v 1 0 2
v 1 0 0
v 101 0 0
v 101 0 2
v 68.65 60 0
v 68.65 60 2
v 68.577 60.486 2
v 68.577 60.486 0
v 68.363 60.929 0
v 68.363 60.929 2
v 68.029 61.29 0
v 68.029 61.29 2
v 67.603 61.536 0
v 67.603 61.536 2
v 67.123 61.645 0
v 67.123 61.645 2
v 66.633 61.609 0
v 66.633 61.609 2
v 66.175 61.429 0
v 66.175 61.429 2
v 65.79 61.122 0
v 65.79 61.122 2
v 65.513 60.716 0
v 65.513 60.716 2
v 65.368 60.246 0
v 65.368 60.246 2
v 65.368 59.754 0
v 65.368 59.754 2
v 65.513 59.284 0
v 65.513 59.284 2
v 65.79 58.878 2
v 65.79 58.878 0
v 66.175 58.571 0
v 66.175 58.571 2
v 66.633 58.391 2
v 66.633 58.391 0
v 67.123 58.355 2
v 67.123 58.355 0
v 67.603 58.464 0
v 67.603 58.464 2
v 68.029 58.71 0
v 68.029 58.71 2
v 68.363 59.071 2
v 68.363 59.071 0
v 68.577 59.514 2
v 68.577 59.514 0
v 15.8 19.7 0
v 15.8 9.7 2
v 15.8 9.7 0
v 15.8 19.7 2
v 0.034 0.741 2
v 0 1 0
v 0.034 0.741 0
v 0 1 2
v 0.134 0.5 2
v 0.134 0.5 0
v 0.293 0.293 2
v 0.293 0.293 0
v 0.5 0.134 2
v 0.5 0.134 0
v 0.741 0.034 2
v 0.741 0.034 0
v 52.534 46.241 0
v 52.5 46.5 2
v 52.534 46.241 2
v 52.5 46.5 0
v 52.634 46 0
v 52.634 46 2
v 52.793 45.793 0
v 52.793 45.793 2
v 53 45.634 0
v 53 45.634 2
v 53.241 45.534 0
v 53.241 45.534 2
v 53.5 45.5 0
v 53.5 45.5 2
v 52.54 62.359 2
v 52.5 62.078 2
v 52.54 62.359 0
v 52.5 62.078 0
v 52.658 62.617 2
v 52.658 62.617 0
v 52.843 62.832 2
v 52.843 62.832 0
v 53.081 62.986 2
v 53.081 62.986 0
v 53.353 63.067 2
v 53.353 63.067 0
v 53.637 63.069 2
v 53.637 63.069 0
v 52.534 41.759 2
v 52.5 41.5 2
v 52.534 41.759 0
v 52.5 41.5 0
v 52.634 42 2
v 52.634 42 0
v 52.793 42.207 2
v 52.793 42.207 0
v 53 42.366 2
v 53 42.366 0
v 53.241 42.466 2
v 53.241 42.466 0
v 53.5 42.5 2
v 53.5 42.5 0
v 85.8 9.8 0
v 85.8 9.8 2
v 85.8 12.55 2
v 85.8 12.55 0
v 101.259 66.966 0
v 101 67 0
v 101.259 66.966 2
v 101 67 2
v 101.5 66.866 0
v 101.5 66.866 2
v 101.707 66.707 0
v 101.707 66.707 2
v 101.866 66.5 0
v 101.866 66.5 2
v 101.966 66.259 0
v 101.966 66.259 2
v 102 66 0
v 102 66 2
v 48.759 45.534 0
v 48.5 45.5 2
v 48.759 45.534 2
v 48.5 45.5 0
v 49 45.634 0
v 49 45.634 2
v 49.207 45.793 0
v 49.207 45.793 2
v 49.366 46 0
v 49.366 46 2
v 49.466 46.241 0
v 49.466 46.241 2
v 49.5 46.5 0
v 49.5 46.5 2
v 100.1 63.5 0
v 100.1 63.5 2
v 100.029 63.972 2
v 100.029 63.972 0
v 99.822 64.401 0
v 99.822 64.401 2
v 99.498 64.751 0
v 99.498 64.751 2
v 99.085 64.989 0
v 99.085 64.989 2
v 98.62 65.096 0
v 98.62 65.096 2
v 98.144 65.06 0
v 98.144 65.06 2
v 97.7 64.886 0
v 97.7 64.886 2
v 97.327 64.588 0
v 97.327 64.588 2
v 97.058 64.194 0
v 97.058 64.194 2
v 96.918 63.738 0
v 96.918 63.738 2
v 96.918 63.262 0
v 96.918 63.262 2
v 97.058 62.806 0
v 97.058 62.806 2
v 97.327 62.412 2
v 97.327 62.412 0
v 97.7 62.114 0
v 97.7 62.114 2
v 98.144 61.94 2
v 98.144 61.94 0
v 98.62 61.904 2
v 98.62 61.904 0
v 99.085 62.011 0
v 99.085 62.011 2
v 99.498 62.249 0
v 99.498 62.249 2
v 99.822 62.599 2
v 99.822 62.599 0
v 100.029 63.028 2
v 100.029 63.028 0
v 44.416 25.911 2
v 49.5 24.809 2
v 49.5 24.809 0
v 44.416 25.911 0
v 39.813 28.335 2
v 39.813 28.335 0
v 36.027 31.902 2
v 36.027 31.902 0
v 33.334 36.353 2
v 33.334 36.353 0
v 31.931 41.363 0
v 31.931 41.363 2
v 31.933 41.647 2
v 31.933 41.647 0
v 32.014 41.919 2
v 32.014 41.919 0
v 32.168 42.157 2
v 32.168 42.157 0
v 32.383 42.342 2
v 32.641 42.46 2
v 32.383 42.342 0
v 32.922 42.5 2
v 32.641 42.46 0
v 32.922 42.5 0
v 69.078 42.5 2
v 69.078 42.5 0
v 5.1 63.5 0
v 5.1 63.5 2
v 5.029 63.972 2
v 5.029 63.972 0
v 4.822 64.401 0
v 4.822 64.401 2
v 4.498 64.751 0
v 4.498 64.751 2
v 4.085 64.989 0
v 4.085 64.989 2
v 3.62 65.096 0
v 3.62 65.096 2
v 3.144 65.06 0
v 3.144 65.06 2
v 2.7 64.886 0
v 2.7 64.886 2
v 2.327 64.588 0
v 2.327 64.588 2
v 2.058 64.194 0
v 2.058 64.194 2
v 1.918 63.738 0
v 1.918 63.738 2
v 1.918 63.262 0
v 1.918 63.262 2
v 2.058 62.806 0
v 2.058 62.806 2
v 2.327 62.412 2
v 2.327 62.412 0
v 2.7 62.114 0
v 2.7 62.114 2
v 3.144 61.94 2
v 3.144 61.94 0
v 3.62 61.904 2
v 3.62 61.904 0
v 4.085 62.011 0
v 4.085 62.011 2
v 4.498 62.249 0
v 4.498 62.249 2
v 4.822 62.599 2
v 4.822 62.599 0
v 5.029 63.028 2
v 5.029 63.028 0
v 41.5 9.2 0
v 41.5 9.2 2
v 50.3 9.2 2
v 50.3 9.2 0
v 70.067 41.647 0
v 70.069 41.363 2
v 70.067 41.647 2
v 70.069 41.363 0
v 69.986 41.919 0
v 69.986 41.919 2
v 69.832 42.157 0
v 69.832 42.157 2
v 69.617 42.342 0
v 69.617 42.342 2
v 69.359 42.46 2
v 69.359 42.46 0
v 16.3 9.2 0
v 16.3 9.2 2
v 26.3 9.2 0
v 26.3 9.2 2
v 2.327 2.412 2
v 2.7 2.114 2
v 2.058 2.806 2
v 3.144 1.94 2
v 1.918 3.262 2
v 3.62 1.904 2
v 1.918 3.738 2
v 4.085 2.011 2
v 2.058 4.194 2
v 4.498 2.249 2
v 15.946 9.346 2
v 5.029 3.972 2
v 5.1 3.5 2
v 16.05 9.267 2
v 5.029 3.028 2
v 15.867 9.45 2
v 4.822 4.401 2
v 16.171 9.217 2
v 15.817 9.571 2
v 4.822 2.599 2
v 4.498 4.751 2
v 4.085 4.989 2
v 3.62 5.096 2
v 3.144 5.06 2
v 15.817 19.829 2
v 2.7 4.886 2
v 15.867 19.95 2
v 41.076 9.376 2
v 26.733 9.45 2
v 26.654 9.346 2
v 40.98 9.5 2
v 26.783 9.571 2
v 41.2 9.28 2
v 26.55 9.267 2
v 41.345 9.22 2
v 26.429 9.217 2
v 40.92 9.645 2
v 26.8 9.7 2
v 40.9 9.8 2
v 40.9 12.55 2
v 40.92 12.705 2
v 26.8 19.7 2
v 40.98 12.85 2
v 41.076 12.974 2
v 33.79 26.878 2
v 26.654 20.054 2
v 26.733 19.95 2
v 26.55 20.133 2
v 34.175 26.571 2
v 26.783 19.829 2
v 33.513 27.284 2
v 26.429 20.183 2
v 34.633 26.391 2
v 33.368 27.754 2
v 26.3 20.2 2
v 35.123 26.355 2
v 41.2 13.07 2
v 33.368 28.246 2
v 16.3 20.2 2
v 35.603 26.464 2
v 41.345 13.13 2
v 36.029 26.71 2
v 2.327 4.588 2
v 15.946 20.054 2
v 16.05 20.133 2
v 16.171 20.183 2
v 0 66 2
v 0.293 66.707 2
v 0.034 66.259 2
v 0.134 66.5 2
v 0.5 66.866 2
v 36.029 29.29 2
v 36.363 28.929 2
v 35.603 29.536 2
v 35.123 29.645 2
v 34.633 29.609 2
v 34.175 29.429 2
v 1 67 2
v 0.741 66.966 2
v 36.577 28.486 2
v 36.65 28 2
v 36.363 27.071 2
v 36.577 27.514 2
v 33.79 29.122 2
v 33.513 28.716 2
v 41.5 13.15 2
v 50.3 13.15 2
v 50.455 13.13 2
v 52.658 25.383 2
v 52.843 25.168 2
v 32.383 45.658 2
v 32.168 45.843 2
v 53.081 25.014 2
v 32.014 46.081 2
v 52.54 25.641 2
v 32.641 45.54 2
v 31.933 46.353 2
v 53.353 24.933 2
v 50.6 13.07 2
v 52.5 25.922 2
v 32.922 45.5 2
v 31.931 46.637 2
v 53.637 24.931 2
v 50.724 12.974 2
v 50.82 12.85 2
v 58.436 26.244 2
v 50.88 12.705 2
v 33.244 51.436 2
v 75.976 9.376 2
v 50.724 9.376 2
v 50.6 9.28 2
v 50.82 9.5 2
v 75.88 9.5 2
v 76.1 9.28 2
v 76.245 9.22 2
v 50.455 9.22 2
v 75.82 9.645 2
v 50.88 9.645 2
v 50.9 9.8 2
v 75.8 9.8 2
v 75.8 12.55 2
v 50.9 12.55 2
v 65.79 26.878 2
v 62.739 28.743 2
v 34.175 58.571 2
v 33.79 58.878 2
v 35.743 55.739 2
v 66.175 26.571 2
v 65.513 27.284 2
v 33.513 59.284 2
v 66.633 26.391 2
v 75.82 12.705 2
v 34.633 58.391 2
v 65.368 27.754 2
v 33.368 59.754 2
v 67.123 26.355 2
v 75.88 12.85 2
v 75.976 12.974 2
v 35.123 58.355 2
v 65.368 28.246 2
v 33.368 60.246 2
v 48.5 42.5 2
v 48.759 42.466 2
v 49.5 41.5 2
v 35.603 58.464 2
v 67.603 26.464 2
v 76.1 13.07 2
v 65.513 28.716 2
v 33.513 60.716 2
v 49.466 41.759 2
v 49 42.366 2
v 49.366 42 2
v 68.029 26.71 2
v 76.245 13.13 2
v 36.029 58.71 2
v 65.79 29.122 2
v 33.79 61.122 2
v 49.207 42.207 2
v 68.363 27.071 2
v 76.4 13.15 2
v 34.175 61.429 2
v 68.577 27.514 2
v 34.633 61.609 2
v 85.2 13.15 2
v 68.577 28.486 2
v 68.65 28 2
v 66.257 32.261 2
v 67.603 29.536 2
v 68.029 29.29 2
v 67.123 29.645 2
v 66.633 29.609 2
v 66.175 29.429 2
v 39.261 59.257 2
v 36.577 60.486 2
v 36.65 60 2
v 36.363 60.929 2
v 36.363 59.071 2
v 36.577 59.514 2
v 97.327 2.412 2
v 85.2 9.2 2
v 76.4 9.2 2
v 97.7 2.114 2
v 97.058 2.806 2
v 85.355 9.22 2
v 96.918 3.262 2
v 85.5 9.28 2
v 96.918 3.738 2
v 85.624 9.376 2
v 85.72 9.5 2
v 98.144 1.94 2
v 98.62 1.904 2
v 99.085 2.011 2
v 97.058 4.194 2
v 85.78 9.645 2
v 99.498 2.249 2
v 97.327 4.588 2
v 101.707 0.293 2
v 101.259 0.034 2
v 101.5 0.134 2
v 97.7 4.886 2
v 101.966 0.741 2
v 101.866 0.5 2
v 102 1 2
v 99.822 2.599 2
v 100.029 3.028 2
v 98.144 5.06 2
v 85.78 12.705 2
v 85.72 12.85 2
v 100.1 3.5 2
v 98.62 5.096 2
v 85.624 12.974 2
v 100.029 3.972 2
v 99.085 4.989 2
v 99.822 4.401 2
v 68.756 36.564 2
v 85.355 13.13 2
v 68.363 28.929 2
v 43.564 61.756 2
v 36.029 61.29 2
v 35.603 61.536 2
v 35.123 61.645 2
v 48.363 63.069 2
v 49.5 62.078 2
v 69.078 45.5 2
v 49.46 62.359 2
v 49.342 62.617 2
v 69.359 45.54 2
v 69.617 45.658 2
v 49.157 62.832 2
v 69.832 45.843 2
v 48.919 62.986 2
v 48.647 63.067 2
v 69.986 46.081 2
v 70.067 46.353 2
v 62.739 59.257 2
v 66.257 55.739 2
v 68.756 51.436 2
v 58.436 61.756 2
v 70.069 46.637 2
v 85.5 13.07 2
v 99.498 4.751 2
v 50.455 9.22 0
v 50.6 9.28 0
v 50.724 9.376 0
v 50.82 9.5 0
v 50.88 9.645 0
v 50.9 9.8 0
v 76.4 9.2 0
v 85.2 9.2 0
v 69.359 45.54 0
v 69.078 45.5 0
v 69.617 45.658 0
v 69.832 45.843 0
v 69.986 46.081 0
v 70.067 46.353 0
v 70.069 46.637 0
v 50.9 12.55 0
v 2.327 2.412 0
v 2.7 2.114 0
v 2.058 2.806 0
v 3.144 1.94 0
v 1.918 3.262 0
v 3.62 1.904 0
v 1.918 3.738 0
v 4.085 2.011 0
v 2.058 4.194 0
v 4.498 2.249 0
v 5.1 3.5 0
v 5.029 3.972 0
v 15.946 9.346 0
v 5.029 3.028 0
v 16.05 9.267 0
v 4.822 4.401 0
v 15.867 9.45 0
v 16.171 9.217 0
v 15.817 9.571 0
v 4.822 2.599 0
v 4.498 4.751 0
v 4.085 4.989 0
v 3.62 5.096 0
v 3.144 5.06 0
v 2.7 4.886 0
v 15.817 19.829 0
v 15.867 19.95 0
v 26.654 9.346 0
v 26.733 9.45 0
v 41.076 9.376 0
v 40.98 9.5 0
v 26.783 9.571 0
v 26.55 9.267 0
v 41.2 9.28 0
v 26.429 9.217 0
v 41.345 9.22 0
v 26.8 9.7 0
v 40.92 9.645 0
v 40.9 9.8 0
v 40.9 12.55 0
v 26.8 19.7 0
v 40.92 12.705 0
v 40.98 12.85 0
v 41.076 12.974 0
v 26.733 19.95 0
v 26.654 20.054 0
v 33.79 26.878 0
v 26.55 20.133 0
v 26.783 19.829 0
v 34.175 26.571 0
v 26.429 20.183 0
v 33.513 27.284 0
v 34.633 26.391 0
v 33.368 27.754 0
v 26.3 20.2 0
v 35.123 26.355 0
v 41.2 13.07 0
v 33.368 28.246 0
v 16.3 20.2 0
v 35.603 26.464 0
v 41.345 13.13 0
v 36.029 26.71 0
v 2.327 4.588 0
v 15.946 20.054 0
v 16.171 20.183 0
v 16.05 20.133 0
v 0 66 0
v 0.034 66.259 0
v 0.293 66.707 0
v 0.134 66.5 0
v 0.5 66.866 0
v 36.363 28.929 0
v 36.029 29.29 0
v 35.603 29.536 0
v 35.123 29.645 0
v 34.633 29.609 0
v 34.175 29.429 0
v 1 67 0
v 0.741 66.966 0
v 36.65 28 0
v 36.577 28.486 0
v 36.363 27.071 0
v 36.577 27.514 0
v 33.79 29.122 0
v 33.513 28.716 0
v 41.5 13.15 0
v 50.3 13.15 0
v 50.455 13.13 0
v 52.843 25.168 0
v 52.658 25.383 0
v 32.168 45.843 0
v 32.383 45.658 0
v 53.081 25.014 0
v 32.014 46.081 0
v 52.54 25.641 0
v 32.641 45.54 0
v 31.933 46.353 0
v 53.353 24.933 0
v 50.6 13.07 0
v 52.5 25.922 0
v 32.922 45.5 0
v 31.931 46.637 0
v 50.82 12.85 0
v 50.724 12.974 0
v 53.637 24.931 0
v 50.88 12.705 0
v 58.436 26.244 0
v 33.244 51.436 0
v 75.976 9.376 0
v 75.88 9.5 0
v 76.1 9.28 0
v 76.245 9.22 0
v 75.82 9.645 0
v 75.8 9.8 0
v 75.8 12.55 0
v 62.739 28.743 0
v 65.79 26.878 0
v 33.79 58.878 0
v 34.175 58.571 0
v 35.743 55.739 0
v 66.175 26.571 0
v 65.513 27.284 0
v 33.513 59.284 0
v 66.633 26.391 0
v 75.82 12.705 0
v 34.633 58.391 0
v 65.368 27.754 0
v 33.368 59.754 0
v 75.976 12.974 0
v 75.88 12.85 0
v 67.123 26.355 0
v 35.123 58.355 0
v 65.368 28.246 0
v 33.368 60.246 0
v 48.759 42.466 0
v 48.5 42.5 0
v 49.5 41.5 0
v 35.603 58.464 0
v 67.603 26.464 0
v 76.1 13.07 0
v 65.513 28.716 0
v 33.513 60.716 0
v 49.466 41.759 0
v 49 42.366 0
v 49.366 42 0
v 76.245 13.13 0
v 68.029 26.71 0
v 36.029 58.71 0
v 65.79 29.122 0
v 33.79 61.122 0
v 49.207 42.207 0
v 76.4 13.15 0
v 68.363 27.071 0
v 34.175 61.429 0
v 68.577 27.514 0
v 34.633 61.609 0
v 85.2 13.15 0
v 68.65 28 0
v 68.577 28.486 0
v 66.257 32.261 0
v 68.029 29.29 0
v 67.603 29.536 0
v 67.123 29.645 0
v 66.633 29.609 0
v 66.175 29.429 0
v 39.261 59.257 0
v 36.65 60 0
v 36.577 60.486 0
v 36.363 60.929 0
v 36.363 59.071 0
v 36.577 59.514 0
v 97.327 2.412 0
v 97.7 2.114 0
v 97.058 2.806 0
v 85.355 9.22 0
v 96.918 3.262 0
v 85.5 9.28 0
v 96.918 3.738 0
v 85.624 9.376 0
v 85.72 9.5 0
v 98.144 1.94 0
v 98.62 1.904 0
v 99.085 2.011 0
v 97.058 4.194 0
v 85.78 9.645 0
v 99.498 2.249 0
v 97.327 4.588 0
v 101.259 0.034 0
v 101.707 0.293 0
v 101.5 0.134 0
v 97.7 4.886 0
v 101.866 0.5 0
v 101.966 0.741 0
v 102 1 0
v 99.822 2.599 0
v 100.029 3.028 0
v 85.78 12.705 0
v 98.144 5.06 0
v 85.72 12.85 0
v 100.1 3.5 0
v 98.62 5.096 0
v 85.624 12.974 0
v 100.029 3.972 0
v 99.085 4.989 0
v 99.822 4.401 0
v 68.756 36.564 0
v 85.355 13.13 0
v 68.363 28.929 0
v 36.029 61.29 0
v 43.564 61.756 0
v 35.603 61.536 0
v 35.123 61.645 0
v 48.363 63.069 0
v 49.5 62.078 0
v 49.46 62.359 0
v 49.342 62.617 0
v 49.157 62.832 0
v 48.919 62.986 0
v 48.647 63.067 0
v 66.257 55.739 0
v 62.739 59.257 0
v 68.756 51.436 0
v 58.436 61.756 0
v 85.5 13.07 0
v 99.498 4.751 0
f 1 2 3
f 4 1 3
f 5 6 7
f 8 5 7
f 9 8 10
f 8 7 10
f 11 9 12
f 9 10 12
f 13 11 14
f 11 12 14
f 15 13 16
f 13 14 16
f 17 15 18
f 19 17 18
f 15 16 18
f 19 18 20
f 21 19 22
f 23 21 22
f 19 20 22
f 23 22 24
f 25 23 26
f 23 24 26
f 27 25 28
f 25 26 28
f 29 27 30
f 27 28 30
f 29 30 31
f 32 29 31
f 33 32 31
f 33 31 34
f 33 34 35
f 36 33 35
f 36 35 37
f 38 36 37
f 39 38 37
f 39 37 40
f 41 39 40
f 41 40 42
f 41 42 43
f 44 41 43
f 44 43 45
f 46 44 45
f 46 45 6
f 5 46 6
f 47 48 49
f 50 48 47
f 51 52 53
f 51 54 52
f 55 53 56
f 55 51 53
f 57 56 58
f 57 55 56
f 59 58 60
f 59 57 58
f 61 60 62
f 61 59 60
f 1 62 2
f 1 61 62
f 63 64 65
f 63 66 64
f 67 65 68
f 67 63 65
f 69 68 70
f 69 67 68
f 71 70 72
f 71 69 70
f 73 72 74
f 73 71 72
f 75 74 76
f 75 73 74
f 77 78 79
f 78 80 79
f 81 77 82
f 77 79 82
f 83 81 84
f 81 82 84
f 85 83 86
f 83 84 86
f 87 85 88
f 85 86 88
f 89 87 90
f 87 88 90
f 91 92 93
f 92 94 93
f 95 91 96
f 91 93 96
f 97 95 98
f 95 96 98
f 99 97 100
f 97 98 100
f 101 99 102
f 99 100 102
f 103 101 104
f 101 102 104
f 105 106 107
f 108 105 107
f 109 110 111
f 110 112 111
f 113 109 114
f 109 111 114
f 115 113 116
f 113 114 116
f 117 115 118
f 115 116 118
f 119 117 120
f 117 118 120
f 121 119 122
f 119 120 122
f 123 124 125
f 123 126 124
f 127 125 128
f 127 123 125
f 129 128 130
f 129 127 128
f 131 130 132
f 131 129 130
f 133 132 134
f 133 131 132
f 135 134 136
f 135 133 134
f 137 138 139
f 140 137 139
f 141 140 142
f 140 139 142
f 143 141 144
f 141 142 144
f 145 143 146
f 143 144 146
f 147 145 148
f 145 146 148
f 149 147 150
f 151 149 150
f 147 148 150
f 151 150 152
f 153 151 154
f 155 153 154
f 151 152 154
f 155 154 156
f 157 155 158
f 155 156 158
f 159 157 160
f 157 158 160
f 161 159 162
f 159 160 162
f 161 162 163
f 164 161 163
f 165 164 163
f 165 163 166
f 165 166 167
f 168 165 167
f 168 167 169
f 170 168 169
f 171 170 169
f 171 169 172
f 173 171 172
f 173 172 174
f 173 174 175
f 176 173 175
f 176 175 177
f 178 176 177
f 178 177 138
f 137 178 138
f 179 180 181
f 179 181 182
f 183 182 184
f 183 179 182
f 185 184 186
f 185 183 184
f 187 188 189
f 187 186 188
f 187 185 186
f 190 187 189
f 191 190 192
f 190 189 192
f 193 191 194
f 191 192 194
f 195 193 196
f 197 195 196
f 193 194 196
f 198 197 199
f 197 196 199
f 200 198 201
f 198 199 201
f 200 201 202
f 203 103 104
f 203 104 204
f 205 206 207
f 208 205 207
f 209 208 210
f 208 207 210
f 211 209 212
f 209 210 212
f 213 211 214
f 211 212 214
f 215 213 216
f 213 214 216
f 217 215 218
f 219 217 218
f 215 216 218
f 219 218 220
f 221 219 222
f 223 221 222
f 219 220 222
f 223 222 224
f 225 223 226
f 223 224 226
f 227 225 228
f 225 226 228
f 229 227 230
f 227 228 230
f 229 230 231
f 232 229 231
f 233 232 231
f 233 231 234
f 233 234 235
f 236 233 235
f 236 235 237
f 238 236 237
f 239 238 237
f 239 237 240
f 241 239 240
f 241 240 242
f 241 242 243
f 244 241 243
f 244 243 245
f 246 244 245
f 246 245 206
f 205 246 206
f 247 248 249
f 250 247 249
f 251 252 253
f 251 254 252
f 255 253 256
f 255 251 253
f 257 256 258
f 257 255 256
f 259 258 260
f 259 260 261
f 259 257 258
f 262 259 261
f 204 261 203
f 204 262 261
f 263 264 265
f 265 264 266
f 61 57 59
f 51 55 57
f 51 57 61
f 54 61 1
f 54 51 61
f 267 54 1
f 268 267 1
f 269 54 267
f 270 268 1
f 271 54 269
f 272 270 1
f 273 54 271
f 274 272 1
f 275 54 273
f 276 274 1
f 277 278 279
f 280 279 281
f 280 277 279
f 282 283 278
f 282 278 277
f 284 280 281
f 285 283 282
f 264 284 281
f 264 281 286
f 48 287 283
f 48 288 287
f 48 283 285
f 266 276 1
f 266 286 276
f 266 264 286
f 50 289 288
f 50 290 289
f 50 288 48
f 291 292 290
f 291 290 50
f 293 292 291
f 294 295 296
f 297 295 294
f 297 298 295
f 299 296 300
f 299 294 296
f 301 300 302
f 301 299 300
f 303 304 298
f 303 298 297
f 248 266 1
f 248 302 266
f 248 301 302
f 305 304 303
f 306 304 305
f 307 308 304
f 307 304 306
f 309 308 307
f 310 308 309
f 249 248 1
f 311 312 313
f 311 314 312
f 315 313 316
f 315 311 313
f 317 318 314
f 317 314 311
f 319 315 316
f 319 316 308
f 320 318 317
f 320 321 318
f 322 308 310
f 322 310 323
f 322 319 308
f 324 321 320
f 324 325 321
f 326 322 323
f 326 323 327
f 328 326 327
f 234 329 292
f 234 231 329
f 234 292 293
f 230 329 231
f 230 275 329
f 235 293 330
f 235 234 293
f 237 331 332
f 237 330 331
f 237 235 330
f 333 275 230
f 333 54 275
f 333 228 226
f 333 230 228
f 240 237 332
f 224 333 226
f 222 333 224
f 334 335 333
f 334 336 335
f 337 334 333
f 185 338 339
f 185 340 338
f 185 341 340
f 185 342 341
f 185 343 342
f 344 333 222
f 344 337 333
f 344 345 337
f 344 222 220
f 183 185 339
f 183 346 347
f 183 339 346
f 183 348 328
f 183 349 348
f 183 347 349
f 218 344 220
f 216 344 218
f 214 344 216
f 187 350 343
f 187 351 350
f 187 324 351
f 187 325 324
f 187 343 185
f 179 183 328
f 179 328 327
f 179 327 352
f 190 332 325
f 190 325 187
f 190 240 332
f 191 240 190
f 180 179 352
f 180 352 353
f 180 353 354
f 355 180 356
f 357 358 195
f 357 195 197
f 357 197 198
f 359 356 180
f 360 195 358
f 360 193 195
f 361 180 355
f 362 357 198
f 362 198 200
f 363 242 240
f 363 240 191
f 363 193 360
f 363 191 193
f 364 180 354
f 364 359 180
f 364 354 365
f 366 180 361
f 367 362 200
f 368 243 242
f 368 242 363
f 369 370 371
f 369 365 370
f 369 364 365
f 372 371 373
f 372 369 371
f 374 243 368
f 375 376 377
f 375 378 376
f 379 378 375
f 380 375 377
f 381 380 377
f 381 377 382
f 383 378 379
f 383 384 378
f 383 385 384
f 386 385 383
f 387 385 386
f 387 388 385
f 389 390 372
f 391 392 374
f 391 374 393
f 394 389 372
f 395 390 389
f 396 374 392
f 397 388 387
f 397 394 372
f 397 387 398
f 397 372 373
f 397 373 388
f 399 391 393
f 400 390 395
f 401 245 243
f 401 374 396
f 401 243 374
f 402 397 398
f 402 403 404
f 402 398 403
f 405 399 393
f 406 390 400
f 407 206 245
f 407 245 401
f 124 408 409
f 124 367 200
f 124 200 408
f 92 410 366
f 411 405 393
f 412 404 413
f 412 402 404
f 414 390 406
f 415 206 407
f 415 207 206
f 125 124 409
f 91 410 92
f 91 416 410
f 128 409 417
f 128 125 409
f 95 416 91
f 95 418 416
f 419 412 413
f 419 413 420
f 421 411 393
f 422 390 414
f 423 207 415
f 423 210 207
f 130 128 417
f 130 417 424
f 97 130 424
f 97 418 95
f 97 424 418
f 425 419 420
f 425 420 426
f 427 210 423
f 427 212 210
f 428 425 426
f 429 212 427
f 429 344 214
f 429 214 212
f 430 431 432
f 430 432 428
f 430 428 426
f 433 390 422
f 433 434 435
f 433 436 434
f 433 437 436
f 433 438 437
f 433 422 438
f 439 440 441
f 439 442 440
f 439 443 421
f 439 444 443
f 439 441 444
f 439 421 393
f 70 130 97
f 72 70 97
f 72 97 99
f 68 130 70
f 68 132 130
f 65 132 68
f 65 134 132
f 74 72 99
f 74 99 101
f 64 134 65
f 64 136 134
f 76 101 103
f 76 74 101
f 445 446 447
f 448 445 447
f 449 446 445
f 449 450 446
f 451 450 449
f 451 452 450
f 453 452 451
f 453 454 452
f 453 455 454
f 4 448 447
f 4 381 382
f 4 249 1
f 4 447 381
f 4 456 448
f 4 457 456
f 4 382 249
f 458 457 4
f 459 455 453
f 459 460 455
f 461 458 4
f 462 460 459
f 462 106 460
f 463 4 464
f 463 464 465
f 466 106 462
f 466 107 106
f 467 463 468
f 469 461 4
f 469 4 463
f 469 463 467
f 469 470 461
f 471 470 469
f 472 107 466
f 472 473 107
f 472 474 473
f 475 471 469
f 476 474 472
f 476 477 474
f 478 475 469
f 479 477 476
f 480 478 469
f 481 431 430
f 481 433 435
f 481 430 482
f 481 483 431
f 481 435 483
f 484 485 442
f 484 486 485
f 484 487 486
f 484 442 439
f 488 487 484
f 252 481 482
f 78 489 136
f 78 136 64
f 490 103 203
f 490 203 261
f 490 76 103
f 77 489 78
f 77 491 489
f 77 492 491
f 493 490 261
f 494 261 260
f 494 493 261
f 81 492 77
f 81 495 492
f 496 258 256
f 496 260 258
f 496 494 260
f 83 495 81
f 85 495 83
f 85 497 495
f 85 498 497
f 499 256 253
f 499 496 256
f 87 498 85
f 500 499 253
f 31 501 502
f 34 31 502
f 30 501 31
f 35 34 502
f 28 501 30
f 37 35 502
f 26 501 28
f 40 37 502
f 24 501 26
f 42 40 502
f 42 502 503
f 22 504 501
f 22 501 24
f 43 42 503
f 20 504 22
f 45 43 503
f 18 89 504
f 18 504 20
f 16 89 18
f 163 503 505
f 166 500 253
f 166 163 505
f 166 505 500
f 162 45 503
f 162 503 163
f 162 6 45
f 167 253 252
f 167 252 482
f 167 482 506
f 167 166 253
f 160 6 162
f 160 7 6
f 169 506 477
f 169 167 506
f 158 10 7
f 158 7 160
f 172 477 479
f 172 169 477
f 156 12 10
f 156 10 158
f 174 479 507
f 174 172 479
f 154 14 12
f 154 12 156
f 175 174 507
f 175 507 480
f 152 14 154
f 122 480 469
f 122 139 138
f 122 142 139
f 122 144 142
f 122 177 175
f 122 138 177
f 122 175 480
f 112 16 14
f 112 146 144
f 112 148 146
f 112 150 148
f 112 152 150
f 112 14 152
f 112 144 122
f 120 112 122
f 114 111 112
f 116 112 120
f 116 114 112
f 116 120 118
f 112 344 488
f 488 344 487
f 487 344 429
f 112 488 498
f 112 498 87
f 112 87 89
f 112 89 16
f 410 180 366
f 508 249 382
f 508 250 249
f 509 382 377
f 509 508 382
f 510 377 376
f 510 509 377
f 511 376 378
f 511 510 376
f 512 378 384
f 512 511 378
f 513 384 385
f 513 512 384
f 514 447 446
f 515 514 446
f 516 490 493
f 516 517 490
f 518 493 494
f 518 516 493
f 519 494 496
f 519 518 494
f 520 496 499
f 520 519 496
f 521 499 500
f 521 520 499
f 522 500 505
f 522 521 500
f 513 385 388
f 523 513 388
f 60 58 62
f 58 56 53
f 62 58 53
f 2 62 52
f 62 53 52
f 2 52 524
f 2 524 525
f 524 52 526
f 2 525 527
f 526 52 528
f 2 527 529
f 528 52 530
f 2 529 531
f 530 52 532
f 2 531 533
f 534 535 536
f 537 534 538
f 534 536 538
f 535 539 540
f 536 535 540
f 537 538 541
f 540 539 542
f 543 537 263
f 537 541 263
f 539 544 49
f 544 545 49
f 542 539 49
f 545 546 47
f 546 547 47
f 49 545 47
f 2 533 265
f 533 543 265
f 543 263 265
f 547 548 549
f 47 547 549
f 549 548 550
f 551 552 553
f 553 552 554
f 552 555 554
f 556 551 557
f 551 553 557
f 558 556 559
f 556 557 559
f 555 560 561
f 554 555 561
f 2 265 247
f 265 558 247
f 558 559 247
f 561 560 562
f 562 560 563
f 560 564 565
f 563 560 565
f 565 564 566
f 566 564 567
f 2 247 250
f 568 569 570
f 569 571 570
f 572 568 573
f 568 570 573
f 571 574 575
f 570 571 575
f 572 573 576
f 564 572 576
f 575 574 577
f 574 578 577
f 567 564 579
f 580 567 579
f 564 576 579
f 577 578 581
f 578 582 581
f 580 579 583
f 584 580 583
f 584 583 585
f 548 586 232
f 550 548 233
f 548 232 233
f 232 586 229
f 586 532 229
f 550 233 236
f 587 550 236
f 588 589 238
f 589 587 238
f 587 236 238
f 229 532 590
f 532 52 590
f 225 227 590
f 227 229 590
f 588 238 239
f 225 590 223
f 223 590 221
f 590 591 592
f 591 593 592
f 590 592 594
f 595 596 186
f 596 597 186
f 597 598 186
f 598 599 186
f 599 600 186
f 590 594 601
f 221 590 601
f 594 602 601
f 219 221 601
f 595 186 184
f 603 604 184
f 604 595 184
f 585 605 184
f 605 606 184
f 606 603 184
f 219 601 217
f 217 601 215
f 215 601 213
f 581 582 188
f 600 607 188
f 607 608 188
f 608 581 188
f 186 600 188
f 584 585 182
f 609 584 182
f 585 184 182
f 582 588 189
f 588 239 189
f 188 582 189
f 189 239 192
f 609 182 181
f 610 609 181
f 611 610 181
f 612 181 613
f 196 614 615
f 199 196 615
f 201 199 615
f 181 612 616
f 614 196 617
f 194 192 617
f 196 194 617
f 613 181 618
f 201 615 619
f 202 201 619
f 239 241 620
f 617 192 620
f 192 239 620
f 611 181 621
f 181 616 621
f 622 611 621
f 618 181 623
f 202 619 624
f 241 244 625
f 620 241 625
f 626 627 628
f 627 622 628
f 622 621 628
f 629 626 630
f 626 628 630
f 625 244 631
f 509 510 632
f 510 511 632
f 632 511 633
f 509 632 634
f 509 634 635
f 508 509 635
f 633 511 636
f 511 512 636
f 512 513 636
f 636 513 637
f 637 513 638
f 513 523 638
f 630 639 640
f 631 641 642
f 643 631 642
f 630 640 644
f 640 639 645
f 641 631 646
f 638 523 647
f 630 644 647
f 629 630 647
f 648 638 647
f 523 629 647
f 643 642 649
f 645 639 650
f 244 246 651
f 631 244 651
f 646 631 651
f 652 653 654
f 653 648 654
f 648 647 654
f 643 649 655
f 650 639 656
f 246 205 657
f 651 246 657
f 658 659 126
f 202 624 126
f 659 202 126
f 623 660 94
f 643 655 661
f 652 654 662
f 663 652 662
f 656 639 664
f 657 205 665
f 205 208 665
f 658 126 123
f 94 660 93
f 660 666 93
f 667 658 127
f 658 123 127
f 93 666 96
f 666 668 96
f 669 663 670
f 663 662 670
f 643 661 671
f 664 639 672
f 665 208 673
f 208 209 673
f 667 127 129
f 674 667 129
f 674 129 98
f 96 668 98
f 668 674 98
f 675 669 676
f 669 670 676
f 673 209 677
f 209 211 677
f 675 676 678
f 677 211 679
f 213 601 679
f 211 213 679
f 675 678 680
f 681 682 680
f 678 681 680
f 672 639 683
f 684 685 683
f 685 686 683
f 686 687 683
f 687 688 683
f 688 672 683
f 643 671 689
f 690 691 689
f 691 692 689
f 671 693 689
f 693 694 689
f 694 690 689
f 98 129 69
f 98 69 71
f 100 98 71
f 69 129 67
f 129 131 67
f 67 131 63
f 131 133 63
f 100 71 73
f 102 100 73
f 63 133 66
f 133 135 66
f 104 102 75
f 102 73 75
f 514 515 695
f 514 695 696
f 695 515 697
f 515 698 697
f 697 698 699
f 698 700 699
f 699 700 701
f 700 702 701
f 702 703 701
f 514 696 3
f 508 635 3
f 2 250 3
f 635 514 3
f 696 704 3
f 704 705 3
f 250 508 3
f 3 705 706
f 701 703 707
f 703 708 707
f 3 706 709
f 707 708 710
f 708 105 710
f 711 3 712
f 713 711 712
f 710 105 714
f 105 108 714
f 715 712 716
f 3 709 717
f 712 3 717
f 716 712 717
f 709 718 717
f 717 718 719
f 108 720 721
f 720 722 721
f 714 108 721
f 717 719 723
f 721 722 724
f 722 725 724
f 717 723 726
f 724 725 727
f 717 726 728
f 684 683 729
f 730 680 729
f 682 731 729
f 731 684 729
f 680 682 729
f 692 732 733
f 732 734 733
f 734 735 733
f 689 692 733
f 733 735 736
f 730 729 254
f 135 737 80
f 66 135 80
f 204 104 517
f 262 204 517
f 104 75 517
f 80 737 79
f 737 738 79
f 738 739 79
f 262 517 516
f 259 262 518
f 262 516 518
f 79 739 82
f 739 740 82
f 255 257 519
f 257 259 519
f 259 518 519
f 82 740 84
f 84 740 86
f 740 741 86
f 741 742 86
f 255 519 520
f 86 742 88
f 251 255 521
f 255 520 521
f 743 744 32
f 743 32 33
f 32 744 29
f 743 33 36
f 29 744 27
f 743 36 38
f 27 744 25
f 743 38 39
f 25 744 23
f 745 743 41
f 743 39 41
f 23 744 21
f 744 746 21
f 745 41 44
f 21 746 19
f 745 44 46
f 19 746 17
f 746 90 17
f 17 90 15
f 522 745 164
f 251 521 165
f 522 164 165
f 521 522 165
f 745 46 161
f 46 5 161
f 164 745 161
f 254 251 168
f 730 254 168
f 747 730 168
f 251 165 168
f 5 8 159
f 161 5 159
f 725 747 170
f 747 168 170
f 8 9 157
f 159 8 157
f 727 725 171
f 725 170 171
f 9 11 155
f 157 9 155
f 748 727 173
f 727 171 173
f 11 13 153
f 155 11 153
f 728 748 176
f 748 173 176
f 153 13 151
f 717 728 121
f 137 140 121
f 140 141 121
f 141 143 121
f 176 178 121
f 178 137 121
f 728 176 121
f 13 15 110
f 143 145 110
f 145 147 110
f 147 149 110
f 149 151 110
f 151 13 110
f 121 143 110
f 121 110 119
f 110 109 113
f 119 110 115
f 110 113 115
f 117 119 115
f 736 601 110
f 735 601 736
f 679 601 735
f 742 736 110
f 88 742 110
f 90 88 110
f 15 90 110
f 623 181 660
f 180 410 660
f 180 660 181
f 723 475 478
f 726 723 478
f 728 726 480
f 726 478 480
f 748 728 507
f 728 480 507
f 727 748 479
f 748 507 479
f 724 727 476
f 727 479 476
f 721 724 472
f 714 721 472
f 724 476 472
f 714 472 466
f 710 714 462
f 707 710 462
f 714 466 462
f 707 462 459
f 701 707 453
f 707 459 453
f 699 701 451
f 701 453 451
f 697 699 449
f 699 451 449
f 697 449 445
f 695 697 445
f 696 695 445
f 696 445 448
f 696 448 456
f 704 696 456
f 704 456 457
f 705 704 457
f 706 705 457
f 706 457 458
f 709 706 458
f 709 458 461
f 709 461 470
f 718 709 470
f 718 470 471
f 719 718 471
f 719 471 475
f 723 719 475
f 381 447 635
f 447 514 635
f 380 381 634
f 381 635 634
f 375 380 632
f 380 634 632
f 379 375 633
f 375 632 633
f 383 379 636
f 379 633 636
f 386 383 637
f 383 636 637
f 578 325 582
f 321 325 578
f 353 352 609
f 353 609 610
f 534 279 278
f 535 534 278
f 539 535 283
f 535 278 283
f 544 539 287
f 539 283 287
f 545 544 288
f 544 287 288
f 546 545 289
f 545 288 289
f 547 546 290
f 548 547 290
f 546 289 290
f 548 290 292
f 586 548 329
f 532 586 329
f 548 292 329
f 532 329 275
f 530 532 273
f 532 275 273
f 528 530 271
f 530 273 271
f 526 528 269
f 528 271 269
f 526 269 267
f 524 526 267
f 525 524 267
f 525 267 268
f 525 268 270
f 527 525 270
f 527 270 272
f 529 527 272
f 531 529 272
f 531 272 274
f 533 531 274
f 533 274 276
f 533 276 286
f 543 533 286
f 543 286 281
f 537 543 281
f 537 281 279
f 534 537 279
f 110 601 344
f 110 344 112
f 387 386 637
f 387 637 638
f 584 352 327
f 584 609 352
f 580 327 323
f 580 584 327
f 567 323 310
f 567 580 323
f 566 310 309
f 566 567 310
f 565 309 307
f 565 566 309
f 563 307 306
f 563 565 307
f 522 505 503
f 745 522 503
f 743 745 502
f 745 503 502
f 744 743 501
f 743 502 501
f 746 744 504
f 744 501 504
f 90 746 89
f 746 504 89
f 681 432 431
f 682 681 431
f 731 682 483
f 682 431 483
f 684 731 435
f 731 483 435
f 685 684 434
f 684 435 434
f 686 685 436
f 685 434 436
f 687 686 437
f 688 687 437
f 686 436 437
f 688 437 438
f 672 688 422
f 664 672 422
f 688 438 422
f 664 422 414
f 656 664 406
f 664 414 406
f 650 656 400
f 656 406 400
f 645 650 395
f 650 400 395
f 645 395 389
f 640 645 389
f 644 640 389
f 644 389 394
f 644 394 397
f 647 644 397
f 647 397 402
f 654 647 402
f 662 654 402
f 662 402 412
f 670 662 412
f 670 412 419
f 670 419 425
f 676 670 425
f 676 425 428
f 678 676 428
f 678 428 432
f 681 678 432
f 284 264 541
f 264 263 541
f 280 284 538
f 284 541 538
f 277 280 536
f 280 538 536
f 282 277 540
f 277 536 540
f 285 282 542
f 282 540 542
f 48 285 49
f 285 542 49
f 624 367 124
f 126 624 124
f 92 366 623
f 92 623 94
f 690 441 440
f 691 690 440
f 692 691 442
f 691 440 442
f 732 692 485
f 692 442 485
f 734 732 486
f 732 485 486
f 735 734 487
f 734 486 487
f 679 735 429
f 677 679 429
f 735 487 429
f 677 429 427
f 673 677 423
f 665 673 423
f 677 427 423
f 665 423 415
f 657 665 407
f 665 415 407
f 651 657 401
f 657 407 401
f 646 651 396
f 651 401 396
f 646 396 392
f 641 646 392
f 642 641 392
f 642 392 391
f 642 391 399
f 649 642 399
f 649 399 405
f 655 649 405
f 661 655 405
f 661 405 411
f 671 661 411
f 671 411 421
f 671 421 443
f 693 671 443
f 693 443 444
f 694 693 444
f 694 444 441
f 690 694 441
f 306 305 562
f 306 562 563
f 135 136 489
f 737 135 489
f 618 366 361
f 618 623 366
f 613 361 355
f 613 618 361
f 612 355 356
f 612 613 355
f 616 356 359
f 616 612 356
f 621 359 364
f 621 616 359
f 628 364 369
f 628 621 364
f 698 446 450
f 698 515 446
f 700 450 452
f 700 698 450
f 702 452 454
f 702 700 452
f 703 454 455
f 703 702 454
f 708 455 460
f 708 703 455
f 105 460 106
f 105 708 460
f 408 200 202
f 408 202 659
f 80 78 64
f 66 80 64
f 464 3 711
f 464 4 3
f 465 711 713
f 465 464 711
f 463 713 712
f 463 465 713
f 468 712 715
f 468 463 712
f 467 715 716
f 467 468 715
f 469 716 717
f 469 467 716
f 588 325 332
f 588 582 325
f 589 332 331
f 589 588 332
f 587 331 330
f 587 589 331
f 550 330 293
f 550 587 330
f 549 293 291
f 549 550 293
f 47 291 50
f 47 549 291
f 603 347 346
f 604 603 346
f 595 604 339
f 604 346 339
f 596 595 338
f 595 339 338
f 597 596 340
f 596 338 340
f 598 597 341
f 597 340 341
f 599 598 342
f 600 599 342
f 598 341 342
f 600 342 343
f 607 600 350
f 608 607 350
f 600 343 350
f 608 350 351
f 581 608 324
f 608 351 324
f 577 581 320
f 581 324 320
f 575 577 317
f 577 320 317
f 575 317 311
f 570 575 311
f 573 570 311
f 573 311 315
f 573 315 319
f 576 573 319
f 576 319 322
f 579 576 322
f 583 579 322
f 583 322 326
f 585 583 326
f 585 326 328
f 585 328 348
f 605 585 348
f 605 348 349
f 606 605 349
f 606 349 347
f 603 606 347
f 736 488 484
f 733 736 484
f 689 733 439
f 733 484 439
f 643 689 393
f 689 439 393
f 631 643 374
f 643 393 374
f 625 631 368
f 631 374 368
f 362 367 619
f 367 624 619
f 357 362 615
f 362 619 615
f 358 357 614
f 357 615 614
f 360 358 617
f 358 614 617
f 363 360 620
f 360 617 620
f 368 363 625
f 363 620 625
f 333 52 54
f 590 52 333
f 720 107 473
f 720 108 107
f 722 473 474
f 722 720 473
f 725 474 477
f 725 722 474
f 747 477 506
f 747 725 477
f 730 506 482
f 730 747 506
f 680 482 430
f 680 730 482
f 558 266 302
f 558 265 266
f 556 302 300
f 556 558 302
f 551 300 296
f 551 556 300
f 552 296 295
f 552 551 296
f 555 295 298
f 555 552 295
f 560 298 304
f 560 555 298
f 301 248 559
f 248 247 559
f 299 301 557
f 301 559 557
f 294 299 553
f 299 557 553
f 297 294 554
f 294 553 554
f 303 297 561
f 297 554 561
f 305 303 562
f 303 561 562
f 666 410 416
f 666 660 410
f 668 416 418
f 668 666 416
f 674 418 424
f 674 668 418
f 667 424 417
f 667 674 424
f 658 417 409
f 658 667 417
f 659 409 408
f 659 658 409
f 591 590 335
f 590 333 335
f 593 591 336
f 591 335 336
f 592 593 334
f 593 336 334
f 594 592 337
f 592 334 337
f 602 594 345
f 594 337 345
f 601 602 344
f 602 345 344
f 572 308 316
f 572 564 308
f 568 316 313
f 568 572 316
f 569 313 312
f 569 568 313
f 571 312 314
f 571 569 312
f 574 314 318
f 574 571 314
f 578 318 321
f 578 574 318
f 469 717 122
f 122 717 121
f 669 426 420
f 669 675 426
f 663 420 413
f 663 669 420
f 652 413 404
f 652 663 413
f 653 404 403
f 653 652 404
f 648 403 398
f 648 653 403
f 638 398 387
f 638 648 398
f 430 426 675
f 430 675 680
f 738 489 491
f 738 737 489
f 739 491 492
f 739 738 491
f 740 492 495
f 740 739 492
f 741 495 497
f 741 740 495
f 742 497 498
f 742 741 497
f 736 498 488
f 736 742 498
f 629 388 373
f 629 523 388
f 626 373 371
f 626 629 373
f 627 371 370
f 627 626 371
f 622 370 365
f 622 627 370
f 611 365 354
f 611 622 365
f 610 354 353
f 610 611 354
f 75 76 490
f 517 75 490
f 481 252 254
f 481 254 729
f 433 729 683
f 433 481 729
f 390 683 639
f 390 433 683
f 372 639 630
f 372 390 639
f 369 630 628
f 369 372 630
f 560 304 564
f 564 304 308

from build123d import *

# Parameters (mm, degrees)
SKETCH_1_W          = 102
SKETCH_1_H          = 67
EXTRUDE_1_DEPTH     = 2
SKETCH_2_R          = 1.6
CUT_EXTRUDE_1_DEPTH = 123.05326706
FILLET_1_R          = 1
SKETCH_3_R          = 1.65
SKETCH_3_W          = 10
SKETCH_3_H          = 3.95
SKETCH_3_W_2        = 11
SKETCH_3_H_2        = 11
CUT_EXTRUDE_2_DEPTH = 123.05326706
FILLET_2_R          = 1
FILLET_3_R          = 0.6
FILLET_4_R          = 0.5


with BuildPart() as part:
    # 草图1 → 凸台-拉伸1 (new body)
    with BuildSketch(Plane.XY):
        with Locations((51, 33.5)):
            Rectangle(SKETCH_1_W, SKETCH_1_H)
    extrude(amount=EXTRUDE_1_DEPTH)

    # 草图2 → 切除-拉伸1 (cut, through all)
    with BuildSketch(Plane.XY.offset(2)):
        with Locations((3.5, 63.5)):
            Circle(SKETCH_2_R)
        with Locations((98.5, 63.5)):
            Circle(SKETCH_2_R)
        with Locations((98.5, 3.5)):
            Circle(SKETCH_2_R)
        with Locations((3.5, 3.5)):
            Circle(SKETCH_2_R)
    extrude(amount=-CUT_EXTRUDE_1_DEPTH, mode=Mode.SUBTRACT)

    # 圆角1
    fillet_1_edges = [part.edges().sort_by_distance(p)[0] for p in [
        (0, 67, 1),
        (102, 67, 1),
        (102, 0, 1),
        (0, 0, 1),
    ]]
    fillet(fillet_1_edges, radius=FILLET_1_R)

    # 草图3 → 切除-拉伸2 (cut, through all)
    with BuildSketch(Plane.XY.offset(2)):
        with Locations((35, 60)):
            Circle(SKETCH_3_R)
        with Locations((67, 60)):
            Circle(SKETCH_3_R)
        with Locations((67, 28)):
            Circle(SKETCH_3_R)
        with Locations((35, 28)):
            Circle(SKETCH_3_R)
        with Locations((80.8, 11.175)):
            Rectangle(SKETCH_3_W, SKETCH_3_H)
        with Locations((45.9, 11.175)):
            Rectangle(SKETCH_3_W, SKETCH_3_H)
        with Locations((21.3, 14.7)):
            Rectangle(SKETCH_3_W_2, SKETCH_3_H_2)
        with BuildLine():
            Line((52.5, 42.5), (70.191469459, 42.5))
            ThreePointArc((70.191469459, 42.5), (64.611805538, 30.388194462), (52.5, 24.808530541))
            Line((52.5, 24.808530541), (52.5, 42.5))
        make_face()
        with BuildLine():
            Line((31.808530541, 45.5), (49.5, 45.5))
            Line((49.5, 45.5), (49.5, 63.191469459))
            ThreePointArc((49.5, 63.191469459), (37.388194462, 57.611805538), (31.808530541, 45.5))
        make_face()
        with BuildLine():
            Line((31.808530541, 42.5), (49.5, 42.5))
            Line((49.5, 42.5), (49.5, 24.808530541))
            ThreePointArc((49.5, 24.808530541), (37.388194462, 30.388194462), (31.808530541, 42.5))
        make_face()
        with BuildLine():
            Line((52.5, 63.191469459), (52.5, 45.5))
            Line((52.5, 45.5), (70.191469459, 45.5))
            ThreePointArc((70.191469459, 45.5), (64.611805538, 57.611805538), (52.5, 63.191469459))
        make_face()
    extrude(amount=-CUT_EXTRUDE_2_DEPTH, mode=Mode.SUBTRACT)

    # 圆角2
    fillet_2_edges = [part.edges().sort_by_distance(p)[0] for p in [
        (70.191469459, 42.5, 1),
        (52.5, 24.808530541, 1),
        (52.5, 42.5, 1),
        (31.808530541, 45.5, 1),
        (49.5, 63.191469459, 1),
        (49.5, 45.5, 1),
        (31.808530541, 42.5, 1),
        (49.5, 42.5, 1),
        (52.5, 63.191469459, 1),
        (70.191469459, 45.5, 1),
        (52.5, 45.5, 1),
    ]]
    fillet(fillet_2_edges, radius=FILLET_2_R)

    # 圆角3
    fillet_3_edges = [part.edges().sort_by_distance(p)[0] for p in [
        (75.8, 9.2, 1),
        (75.8, 13.15, 1),
        (85.8, 13.15, 1),
        (85.8, 9.2, 1),
        (40.9, 9.2, 1),
        (40.9, 13.15, 1),
        (50.9, 13.15, 1),
        (50.9, 9.2, 1),
    ]]
    fillet(fillet_3_edges, radius=FILLET_3_R)

    # 圆角4
    fillet_4_edges = [part.edges().sort_by_distance(p)[0] for p in [
        (26.8, 20.2, 1),
        (26.8, 9.2, 1),
        (15.8, 9.2, 1),
        (15.8, 20.2, 1),
    ]]
    fillet(fillet_4_edges, radius=FILLET_4_R)


solid = part.part
